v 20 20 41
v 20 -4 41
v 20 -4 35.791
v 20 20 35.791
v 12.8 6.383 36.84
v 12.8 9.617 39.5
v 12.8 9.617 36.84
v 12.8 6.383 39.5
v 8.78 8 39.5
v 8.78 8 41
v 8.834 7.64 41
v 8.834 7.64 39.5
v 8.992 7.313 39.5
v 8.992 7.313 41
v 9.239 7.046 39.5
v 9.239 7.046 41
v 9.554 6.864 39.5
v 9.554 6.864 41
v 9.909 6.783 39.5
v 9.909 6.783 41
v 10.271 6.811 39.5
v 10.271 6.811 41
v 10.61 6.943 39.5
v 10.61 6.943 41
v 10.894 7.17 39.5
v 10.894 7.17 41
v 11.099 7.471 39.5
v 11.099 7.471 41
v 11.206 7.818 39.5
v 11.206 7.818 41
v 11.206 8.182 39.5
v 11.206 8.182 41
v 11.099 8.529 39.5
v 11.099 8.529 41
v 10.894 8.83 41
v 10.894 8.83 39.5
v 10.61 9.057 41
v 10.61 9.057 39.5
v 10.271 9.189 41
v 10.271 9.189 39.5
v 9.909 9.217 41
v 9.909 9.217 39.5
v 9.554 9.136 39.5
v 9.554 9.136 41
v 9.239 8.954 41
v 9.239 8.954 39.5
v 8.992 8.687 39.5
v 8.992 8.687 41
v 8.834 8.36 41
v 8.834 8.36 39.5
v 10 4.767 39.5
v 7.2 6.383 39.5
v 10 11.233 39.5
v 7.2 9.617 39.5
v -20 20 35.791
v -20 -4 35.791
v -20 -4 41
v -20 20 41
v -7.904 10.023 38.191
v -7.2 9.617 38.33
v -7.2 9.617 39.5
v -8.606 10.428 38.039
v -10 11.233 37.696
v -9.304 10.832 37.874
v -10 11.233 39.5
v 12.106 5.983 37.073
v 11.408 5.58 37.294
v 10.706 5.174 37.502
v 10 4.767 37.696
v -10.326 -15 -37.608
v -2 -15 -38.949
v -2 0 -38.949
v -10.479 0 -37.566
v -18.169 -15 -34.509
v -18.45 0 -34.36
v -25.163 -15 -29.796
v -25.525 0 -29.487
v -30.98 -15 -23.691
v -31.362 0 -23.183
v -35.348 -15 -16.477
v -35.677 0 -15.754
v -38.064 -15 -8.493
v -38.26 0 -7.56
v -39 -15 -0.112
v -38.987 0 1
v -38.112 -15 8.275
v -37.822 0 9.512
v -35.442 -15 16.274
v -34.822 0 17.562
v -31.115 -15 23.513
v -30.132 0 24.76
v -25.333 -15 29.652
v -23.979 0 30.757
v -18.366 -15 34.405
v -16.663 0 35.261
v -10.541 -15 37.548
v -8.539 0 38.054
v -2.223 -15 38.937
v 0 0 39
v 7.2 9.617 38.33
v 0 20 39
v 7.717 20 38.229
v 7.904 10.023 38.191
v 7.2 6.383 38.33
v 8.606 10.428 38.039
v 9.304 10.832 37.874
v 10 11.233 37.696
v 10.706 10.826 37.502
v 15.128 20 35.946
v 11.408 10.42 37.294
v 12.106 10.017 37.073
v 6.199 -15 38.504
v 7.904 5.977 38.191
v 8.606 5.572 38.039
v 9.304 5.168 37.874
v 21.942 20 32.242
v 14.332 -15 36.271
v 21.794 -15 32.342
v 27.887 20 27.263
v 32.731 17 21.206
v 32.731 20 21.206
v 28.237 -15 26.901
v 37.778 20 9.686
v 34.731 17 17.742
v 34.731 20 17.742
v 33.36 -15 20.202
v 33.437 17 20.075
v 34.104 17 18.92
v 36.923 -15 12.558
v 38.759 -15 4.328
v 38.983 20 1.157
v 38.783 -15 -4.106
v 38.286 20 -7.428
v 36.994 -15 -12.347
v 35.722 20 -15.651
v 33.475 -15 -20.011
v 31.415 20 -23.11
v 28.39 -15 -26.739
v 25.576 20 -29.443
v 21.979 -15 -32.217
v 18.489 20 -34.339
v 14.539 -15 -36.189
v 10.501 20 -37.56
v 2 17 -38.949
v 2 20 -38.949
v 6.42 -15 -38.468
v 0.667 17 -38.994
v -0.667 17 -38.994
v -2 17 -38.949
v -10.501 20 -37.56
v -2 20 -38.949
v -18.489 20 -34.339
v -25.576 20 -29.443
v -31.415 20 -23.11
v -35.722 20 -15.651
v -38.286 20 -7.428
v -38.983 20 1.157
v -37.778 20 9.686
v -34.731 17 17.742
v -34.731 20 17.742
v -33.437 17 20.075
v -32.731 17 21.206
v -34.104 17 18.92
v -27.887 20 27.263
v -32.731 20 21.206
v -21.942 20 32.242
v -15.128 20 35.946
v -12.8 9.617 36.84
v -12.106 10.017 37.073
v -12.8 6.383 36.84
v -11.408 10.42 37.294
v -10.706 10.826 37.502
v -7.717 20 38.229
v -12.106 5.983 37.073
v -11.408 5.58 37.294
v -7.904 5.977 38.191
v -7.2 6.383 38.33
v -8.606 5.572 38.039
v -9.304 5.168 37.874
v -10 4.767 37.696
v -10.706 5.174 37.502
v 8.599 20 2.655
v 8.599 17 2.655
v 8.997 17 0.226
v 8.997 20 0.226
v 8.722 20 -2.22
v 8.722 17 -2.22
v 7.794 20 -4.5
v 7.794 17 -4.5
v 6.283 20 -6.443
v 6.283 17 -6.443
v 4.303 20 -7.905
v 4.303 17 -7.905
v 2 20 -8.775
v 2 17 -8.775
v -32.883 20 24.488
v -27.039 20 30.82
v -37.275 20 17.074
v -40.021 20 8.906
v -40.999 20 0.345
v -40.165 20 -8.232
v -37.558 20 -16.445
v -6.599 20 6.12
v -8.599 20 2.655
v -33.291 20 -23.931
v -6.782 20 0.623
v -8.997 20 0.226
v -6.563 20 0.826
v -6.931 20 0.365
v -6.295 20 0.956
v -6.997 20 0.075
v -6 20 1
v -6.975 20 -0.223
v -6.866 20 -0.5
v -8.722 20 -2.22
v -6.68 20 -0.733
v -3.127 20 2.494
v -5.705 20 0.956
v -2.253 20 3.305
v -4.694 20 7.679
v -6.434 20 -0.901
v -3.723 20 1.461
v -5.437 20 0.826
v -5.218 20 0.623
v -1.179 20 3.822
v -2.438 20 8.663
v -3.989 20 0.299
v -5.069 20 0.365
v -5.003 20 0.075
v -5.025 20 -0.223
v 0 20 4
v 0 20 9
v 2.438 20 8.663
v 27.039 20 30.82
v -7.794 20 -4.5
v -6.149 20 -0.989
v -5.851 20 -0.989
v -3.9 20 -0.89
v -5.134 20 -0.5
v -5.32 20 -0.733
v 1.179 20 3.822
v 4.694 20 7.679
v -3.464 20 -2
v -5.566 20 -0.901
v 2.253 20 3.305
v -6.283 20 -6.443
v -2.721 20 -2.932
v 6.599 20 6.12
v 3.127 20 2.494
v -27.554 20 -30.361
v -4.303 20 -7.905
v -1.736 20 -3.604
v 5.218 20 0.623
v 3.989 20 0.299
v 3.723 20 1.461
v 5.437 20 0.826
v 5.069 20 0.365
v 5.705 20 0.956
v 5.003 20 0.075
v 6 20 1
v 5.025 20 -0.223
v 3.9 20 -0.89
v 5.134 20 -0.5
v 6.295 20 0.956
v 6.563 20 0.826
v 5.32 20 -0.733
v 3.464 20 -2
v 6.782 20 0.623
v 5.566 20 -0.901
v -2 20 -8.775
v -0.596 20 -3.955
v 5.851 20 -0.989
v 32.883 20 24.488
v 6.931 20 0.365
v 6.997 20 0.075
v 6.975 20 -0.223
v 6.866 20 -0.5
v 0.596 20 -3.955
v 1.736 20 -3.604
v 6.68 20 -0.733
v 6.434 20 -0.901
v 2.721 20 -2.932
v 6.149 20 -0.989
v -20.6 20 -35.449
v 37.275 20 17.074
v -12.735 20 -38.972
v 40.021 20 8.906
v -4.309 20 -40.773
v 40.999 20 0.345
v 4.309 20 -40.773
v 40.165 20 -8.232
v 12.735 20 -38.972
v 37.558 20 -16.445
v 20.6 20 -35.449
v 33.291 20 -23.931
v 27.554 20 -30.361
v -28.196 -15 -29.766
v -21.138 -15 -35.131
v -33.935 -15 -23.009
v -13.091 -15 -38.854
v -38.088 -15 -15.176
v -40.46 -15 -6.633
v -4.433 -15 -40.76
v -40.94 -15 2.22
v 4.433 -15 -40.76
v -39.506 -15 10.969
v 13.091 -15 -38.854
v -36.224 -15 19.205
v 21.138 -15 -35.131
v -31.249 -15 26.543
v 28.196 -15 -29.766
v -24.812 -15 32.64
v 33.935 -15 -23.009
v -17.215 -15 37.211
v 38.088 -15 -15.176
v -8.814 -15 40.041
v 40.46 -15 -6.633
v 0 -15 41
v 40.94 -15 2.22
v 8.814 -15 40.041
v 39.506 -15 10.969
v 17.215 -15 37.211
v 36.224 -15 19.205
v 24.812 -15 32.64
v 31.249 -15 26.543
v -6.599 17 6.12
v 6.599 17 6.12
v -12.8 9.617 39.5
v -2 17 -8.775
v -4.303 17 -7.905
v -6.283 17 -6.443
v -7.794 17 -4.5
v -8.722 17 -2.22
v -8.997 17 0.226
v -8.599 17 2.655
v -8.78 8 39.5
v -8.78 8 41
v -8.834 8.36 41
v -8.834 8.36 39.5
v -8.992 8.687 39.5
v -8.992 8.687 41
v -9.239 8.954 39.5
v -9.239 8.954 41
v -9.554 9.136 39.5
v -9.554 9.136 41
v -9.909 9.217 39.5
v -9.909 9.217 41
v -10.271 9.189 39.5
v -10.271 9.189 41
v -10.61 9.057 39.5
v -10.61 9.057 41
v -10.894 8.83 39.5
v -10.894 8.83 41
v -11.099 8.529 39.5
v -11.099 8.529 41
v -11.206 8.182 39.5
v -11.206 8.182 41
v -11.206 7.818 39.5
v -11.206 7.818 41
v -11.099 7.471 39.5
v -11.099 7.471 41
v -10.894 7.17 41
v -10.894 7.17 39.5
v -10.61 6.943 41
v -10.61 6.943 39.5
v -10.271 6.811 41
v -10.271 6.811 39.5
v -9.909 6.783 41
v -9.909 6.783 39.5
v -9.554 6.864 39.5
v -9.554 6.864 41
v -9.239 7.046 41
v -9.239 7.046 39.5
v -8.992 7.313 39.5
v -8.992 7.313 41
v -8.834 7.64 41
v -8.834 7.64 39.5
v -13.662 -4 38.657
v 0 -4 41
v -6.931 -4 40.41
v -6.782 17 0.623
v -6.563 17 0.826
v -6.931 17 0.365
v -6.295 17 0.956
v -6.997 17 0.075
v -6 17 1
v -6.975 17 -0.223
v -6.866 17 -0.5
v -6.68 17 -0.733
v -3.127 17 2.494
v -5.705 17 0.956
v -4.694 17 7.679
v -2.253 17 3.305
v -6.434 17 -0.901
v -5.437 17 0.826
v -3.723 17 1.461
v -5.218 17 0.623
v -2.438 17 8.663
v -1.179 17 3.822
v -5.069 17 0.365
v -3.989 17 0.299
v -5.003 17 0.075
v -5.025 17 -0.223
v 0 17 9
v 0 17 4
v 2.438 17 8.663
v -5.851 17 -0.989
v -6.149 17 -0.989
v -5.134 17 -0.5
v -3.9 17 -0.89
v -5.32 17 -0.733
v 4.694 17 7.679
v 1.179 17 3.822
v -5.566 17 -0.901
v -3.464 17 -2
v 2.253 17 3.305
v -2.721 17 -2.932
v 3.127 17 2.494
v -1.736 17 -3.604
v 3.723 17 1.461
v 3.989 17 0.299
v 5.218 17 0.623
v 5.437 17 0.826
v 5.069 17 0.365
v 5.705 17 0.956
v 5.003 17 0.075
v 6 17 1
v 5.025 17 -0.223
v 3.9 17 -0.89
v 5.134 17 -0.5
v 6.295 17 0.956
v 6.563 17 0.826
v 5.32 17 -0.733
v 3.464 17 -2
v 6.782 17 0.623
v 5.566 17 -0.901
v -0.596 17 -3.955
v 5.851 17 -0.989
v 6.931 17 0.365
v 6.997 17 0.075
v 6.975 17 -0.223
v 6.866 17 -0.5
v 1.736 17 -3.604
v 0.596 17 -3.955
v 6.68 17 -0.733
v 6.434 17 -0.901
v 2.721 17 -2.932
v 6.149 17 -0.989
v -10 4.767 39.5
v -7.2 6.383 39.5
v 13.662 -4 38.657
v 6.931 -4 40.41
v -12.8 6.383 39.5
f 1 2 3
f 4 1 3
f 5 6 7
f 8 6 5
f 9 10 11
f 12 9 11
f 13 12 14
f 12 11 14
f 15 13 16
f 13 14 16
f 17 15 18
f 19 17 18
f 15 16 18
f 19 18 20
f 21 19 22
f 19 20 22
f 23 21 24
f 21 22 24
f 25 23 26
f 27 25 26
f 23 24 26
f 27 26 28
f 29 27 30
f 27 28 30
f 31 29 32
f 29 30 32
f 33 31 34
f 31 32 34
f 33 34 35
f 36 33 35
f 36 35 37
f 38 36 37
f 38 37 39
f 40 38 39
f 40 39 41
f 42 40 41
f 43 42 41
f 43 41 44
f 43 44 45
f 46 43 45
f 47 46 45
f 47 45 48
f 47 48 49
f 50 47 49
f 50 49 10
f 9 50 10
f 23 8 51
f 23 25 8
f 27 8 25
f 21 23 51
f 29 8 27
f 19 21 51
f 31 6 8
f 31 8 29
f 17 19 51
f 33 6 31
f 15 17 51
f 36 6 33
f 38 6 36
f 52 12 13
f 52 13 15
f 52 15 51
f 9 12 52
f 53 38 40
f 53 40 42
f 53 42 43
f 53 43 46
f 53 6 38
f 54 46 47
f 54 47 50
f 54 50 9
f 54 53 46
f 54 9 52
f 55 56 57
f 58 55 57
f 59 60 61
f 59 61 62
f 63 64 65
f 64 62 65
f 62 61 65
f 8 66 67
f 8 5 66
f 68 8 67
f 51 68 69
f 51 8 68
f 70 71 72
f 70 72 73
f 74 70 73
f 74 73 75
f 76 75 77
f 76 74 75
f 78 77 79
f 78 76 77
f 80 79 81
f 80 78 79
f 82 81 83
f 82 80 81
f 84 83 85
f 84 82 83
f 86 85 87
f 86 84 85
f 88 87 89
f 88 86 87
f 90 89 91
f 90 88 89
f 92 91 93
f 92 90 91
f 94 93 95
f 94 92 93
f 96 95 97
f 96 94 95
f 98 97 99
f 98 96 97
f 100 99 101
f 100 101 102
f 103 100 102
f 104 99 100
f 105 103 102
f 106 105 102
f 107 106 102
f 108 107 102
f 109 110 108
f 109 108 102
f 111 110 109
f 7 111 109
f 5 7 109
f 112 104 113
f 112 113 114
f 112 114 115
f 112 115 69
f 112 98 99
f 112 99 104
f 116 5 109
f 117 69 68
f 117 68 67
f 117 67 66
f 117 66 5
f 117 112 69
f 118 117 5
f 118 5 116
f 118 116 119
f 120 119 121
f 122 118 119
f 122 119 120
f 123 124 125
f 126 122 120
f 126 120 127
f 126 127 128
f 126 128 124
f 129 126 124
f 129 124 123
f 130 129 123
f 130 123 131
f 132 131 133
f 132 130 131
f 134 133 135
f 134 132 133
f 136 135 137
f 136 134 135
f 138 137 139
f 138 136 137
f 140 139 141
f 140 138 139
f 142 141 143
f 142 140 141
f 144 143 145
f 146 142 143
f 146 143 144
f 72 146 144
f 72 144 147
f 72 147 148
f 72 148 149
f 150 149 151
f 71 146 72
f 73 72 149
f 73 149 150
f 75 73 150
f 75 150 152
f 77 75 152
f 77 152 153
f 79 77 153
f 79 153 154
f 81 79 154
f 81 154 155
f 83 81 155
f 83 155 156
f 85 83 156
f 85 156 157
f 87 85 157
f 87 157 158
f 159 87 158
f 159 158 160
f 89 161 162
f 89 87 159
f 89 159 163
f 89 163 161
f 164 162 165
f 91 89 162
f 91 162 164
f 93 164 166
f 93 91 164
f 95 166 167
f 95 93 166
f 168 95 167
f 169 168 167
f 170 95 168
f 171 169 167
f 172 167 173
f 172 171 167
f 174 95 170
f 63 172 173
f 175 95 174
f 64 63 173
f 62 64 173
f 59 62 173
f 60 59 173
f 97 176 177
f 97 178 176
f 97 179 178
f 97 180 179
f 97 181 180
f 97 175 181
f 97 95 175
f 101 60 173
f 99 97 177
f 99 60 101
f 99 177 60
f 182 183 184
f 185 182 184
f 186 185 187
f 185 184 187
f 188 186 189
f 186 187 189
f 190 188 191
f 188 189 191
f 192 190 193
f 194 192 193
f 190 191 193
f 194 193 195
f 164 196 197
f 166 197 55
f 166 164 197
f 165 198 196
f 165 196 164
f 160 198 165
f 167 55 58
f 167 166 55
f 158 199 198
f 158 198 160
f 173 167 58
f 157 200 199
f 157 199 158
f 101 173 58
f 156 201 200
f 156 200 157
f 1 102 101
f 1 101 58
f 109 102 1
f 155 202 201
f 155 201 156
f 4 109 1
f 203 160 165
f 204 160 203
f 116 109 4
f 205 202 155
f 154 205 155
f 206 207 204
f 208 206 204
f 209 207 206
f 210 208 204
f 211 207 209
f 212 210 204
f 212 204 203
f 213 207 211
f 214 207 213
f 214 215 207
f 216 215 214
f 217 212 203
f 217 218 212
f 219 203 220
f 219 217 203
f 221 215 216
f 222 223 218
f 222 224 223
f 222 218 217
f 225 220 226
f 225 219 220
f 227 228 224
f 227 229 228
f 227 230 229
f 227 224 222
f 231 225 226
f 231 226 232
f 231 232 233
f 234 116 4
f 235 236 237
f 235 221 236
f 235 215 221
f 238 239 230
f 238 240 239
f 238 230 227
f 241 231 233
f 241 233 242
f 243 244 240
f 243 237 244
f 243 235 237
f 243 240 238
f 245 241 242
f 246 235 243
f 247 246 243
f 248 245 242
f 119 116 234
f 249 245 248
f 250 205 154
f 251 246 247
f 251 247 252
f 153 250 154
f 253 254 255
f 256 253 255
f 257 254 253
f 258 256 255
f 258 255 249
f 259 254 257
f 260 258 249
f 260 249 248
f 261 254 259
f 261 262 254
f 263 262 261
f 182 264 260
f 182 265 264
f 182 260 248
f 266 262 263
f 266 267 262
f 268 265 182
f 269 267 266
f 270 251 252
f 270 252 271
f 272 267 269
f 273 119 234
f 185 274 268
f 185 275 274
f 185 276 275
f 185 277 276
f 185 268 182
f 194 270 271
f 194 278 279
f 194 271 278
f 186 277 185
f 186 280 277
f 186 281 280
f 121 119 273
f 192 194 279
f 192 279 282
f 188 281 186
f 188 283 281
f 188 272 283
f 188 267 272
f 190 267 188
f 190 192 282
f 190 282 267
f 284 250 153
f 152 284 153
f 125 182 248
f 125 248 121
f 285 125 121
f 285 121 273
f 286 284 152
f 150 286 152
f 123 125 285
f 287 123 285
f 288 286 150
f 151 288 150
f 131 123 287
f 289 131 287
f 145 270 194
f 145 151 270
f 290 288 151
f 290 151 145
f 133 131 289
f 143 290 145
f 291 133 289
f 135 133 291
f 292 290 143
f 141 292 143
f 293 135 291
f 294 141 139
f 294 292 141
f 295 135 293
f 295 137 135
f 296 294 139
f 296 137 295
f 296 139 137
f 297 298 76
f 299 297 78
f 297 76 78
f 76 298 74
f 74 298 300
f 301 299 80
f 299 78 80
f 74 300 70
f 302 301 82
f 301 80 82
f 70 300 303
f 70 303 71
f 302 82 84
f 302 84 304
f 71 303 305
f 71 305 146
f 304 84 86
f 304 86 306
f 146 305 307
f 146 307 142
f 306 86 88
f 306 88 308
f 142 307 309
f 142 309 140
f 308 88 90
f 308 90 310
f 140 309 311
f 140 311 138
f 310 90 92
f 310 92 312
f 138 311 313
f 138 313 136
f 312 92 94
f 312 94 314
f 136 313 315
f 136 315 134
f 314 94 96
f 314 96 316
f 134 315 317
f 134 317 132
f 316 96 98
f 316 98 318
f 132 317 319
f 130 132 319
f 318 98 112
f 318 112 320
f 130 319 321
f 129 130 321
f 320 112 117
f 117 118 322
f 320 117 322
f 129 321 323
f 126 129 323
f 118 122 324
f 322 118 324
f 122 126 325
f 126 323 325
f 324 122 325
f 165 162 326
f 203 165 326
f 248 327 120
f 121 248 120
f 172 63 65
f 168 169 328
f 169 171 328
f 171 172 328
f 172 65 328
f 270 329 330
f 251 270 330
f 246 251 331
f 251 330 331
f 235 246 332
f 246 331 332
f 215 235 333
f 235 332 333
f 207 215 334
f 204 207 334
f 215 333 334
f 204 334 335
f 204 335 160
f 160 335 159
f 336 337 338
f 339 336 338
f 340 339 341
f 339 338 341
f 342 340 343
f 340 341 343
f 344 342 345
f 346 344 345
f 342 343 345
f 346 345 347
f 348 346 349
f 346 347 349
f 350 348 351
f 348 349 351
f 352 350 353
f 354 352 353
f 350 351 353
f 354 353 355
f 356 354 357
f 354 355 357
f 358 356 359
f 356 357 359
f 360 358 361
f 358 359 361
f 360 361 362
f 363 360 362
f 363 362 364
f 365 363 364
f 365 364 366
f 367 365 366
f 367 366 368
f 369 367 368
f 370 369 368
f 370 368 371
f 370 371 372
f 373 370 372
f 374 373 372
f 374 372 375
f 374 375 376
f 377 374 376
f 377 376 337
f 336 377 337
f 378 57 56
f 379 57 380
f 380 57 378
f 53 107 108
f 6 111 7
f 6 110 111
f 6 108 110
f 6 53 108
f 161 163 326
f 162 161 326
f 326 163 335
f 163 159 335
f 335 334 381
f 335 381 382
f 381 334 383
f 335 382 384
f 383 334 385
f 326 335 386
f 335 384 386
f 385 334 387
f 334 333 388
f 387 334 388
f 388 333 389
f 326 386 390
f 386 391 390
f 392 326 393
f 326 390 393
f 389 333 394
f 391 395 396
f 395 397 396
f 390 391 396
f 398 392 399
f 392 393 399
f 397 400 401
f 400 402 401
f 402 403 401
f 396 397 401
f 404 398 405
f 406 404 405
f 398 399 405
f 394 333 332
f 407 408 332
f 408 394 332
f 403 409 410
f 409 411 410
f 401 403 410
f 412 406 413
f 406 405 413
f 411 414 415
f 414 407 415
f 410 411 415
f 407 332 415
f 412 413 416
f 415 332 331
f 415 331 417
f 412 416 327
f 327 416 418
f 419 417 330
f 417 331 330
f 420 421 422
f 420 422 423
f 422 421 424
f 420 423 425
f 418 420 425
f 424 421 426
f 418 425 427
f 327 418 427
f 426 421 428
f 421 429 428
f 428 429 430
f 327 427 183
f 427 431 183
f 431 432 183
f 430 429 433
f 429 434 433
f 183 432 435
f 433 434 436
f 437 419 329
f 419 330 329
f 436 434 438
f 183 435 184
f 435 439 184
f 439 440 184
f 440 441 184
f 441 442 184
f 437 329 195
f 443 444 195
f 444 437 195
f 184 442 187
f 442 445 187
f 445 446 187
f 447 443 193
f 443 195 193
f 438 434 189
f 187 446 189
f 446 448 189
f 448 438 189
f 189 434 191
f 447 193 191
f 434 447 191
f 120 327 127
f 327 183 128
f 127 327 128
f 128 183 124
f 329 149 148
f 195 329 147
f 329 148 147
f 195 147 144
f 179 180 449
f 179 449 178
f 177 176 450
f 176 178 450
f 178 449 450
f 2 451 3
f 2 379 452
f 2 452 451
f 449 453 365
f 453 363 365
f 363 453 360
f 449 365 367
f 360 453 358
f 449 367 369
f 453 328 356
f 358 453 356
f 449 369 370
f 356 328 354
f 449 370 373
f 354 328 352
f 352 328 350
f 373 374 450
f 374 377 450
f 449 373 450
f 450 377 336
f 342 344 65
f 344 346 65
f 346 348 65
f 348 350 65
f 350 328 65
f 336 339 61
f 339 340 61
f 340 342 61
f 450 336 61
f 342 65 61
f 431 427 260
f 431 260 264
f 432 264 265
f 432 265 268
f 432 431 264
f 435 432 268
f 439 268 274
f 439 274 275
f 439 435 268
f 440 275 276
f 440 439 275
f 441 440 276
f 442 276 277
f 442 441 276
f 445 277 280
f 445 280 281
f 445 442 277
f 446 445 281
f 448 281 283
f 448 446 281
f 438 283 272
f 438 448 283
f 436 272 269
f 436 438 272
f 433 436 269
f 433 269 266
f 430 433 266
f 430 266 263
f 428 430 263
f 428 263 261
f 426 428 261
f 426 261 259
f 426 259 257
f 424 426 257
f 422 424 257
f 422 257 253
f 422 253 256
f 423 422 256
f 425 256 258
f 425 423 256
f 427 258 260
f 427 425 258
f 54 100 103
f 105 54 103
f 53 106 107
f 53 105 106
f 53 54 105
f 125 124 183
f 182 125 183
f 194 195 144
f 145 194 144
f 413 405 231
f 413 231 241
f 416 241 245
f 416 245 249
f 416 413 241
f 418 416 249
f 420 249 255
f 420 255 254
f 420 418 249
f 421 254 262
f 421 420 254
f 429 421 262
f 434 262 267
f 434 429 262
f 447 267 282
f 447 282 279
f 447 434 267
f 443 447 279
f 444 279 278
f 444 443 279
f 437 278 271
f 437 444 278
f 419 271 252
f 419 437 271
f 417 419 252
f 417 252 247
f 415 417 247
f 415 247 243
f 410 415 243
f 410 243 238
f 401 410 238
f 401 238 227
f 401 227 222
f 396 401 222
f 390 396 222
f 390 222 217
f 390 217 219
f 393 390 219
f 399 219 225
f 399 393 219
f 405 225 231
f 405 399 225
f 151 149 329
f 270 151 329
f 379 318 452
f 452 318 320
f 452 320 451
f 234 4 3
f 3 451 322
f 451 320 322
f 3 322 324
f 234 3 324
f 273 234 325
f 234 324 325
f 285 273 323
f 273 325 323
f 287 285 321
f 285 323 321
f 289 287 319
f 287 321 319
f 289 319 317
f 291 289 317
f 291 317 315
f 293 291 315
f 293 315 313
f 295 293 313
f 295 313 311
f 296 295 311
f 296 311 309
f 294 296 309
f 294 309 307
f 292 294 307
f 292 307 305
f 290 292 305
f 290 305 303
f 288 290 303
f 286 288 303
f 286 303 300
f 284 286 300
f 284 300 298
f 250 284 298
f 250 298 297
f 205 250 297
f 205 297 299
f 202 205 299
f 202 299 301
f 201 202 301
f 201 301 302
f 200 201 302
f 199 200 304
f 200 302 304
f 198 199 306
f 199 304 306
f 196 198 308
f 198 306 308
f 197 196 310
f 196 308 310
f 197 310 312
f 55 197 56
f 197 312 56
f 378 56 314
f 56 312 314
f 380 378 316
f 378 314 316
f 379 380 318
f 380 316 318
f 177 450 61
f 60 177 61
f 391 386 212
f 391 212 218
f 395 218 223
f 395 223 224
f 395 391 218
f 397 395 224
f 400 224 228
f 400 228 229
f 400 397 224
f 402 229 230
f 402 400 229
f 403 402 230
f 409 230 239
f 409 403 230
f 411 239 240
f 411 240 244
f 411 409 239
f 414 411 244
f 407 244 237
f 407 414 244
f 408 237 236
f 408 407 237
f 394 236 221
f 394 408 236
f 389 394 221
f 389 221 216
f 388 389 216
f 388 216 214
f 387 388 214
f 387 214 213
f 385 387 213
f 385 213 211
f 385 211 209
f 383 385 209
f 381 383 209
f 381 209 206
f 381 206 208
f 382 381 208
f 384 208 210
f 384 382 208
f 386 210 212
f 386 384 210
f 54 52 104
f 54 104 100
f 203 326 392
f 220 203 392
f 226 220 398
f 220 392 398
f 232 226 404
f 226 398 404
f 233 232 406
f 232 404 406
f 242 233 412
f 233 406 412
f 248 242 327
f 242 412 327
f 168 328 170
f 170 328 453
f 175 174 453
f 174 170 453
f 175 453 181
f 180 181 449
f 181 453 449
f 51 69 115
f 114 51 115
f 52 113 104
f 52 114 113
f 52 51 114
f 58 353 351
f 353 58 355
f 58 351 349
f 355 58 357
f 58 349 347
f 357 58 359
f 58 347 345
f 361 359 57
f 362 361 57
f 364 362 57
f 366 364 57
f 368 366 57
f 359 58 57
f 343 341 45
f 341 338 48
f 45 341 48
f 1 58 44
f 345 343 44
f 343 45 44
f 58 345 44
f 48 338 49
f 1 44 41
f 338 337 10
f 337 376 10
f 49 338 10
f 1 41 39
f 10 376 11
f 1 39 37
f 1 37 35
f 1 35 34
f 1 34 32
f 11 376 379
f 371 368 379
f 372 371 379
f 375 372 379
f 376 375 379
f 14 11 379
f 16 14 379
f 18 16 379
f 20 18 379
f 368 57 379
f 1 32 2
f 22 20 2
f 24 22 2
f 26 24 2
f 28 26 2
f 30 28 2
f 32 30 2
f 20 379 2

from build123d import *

# Parameters (mm, degrees)
SKETCH_1_R           = 41
SKETCH_1_R_2         = 39
EXTRUDE_1_DEPTH      = 20
EXTRUDE_START        = -14
EXTRUDE_2_DEPTH      = 14
EXTRUDE_START_2      = -3
SKETCH_3_R           = 4
SKETCH_3_R_2         = 1
EXTRUDE_3_DEPTH      = 3
CUT_EXTRUDE_3_DEPTH  = 3
EXTRUDE_5_DEPTH      = 10
EXTRUDE_5_DEPTH_BACK = 15
SKETCH_1_2_R         = 41
SKETCH_1_2_R_2       = 39
EXTRUDE_START_3      = 10
EXTRUDE_7_DEPTH      = 10
EXTRUDE_8_DEPTH      = 10
EXTRUDE_8_DEPTH_BACK = 5
CUT_EXTRUDE_4_DEPTH  = 10
EXTRUDE_9_DEPTH      = 10
EXTRUDE_9_DEPTH_BACK = 1.5
CUT_EXTRUDE_6_DEPTH  = 10
SKETCH_16_R          = 1.22
CUT_EXTRUDE_7_DEPTH  = 3


with BuildPart() as part:
    # 草图1 → 凸台-拉伸1 (new body)
    with BuildSketch(Plane(origin=(0, 0, 0), x_dir=(1, 0, 0), z_dir=(0, 1, 0))):
        Circle(SKETCH_1_R)
        Circle(SKETCH_1_R_2, mode=Mode.SUBTRACT)
    extrude(amount=EXTRUDE_1_DEPTH)

    # 草图2 → 凸台-拉伸2 (add)
    with BuildSketch(Plane(origin=(0, 20, 0), x_dir=(1, 0, 0), z_dir=(0, 1, 0)).offset(EXTRUDE_START)):
        with BuildLine():
            Line((3.5e-08, -41), (20, -41))
            Line((20, -41), (20, -35.791060336))
            ThreePointArc((20, -35.791060336), (10.333598766, -39.676400247), (3.5e-08, -41))
        make_face()
        with BuildLine():
            Line((-20, -41), (3.5e-08, -41))
            ThreePointArc((3.5e-08, -41), (-10.333598732, -39.676400256), (-20, -35.791060336))
            Line((-20, -35.791060336), (-20, -41))
        make_face()
    extrude(amount=EXTRUDE_2_DEPTH)

    # 草图3 → 凸台-拉伸3 (add)
    with BuildSketch(Plane(origin=(0, 20, 0), x_dir=(1, 0, 0), z_dir=(0, 1, 0)).offset(EXTRUDE_START_2)):
        with BuildLine():
            Line((-2, 38.948684188), (-2, 8.774964387))
            ThreePointArc((-2, 8.774964387), (-7.794228634, 4.5), (-8.599342077, -2.655431386))
            Line((-8.599342077, -2.655431386), (-34.730549951, -17.742291287))
            ThreePointArc((-34.730549951, -17.742291287), (-33.774990748, -19.5), (-32.730549951, -21.206392902))
            Line((-32.730549951, -21.206392902), (-6.599342077, -6.119533001))
            ThreePointArc((-6.599342077, -6.119533001), (0, -9), (6.599342077, -6.119533001))
            Line((6.599342077, -6.119533001), (32.730549951, -21.206392902))
            ThreePointArc((32.730549951, -21.206392902), (33.774990748, -19.5), (34.730549951, -17.742291287))
            Line((34.730549951, -17.742291287), (8.599342077, -2.655431386))
            ThreePointArc((8.599342077, -2.655431386), (7.794228634, 4.5), (2, 8.774964387))
            Line((2, 8.774964387), (2, 38.948684188))
            ThreePointArc((2, 38.948684188), (0, 39), (-2, 38.948684188))
        make_face()
        Circle(SKETCH_3_R, mode=Mode.SUBTRACT)
        with Locations((-6, 0)):
            Circle(SKETCH_3_R_2, mode=Mode.SUBTRACT)
        with Locations((6, 0)):
            Circle(SKETCH_3_R_2, mode=Mode.SUBTRACT)
    extrude(amount=EXTRUDE_3_DEPTH)

    # 草图7 → 切除-拉伸3 (cut)
    with BuildSketch(Plane.XZ.offset(-6)):
        with BuildLine():
            Line((0, 41), (-20, 41))
            Line((-20, 41), (-20, 35.791060336))
            ThreePointArc((-20, 35.791060336), (-10.333598749, 39.676400251), (0, 41))
        make_face()
        with BuildLine():
            Line((20, 41), (0, 41))
            ThreePointArc((0, 41), (10.333598749, 39.676400251), (20, 35.791060336))
            Line((20, 35.791060336), (20, 41))
        make_face()
    extrude(amount=-CUT_EXTRUDE_3_DEPTH, mode=Mode.SUBTRACT)

    # 草图1<2> → 凸台-拉伸5 (add, two sides: drawn at the far end of the back side and taken through both)
    with BuildSketch(Plane(origin=(0, 0, 0), x_dir=(1, 0, 0), z_dir=(0, 1, 0)).offset(-EXTRUDE_5_DEPTH_BACK)):
        Circle(SKETCH_1_2_R)
        Circle(SKETCH_1_2_R_2, mode=Mode.SUBTRACT)
    extrude(amount=EXTRUDE_5_DEPTH + EXTRUDE_5_DEPTH_BACK)

    # 草图7<4> → 凸台-拉伸7 (add)
    with BuildSketch(Plane.XZ.offset(-6).offset(EXTRUDE_START_3)):
        with BuildLine():
            Line((0, 41), (-20, 41))
            Line((-20, 41), (-20, 35.791060336))
            ThreePointArc((-20, 35.791060336), (-10.333598749, 39.676400251), (0, 41))
        make_face()
        with BuildLine():
            Line((20, 41), (0, 41))
            ThreePointArc((0, 41), (10.333598749, 39.676400251), (20, 35.791060336))
            Line((20, 35.791060336), (20, 41))
        make_face()
    extrude(amount=-EXTRUDE_7_DEPTH)

    # 草图7<5> → 凸台-拉伸8 (add, two sides: drawn at the far end of the back side and taken through both)
    with BuildSketch(Plane.XZ.offset(-6).offset(-EXTRUDE_8_DEPTH_BACK)):
        with BuildLine():
            Line((0, 41), (-20, 41))
            Line((-20, 41), (-20, 35.791060336))
            ThreePointArc((-20, 35.791060336), (-10.333598749, 39.676400251), (0, 41))
        make_face()
        with BuildLine():
            Line((20, 41), (0, 41))
            ThreePointArc((0, 41), (10.333598749, 39.676400251), (20, 35.791060336))
            Line((20, 35.791060336), (20, 41))
        make_face()
    extrude(amount=EXTRUDE_8_DEPTH + EXTRUDE_8_DEPTH_BACK)

    # 草图4 → 切除-拉伸4 (cut)
    with BuildSketch(Plane.XY.offset(41)):
        Polygon((-10, 4.766838493), (-7.2, 6.383419246), (-7.2, 9.616580754), (-10, 11.233161507), (-12.8, 9.616580754), (-12.8, 6.383419246), align=None)
        Polygon((12.8, 6.383419246), (10, 4.766838493), (7.2, 6.383419246), (7.2, 9.616580754), (10, 11.233161507), (12.8, 9.616580754), align=None)
    extrude(amount=-CUT_EXTRUDE_4_DEPTH, mode=Mode.SUBTRACT)

    # 草图4<3> → 凸台-拉伸9 (add, two sides: drawn at the far end of the back side and taken through both)
    with BuildSketch(Plane.XY.offset(41).offset(-EXTRUDE_9_DEPTH_BACK)):
        Polygon((-10, 4.766838493), (-7.2, 6.383419246), (-7.2, 9.616580754), (-10, 11.233161507), (-12.8, 9.616580754), (-12.8, 6.383419246), align=None)
        Polygon((12.8, 6.383419246), (10, 4.766838493), (7.2, 6.383419246), (7.2, 9.616580754), (10, 11.233161507), (12.8, 9.616580754), align=None)
    extrude(amount=EXTRUDE_9_DEPTH + EXTRUDE_9_DEPTH_BACK)

    # 草图13 → 切除-拉伸6 (cut)
    with BuildSketch(Plane.XY.offset(51)):
        Polygon((10, 11.233161507), (7.2, 9.616580754), (7.2, 6.383419246), (10, 4.766838493), (12.8, 6.383419246), (12.8, 9.616580754), align=None)
        Polygon((-10, 11.233161507), (-12.8, 9.616580754), (-12.8, 6.383419246), (-10, 4.766838493), (-7.2, 6.383419246), (-7.2, 9.616580754), align=None)
    extrude(amount=-CUT_EXTRUDE_6_DEPTH, mode=Mode.SUBTRACT)

    # 草图16 → 切除-拉伸7 (cut)
    with BuildSketch(Plane.XY.offset(41)):
        with Locations((-10, 8)):
            Circle(SKETCH_16_R)
        with Locations((10, 8)):
            Circle(SKETCH_16_R)
    extrude(amount=-CUT_EXTRUDE_7_DEPTH, mode=Mode.SUBTRACT)


solid = part.part
